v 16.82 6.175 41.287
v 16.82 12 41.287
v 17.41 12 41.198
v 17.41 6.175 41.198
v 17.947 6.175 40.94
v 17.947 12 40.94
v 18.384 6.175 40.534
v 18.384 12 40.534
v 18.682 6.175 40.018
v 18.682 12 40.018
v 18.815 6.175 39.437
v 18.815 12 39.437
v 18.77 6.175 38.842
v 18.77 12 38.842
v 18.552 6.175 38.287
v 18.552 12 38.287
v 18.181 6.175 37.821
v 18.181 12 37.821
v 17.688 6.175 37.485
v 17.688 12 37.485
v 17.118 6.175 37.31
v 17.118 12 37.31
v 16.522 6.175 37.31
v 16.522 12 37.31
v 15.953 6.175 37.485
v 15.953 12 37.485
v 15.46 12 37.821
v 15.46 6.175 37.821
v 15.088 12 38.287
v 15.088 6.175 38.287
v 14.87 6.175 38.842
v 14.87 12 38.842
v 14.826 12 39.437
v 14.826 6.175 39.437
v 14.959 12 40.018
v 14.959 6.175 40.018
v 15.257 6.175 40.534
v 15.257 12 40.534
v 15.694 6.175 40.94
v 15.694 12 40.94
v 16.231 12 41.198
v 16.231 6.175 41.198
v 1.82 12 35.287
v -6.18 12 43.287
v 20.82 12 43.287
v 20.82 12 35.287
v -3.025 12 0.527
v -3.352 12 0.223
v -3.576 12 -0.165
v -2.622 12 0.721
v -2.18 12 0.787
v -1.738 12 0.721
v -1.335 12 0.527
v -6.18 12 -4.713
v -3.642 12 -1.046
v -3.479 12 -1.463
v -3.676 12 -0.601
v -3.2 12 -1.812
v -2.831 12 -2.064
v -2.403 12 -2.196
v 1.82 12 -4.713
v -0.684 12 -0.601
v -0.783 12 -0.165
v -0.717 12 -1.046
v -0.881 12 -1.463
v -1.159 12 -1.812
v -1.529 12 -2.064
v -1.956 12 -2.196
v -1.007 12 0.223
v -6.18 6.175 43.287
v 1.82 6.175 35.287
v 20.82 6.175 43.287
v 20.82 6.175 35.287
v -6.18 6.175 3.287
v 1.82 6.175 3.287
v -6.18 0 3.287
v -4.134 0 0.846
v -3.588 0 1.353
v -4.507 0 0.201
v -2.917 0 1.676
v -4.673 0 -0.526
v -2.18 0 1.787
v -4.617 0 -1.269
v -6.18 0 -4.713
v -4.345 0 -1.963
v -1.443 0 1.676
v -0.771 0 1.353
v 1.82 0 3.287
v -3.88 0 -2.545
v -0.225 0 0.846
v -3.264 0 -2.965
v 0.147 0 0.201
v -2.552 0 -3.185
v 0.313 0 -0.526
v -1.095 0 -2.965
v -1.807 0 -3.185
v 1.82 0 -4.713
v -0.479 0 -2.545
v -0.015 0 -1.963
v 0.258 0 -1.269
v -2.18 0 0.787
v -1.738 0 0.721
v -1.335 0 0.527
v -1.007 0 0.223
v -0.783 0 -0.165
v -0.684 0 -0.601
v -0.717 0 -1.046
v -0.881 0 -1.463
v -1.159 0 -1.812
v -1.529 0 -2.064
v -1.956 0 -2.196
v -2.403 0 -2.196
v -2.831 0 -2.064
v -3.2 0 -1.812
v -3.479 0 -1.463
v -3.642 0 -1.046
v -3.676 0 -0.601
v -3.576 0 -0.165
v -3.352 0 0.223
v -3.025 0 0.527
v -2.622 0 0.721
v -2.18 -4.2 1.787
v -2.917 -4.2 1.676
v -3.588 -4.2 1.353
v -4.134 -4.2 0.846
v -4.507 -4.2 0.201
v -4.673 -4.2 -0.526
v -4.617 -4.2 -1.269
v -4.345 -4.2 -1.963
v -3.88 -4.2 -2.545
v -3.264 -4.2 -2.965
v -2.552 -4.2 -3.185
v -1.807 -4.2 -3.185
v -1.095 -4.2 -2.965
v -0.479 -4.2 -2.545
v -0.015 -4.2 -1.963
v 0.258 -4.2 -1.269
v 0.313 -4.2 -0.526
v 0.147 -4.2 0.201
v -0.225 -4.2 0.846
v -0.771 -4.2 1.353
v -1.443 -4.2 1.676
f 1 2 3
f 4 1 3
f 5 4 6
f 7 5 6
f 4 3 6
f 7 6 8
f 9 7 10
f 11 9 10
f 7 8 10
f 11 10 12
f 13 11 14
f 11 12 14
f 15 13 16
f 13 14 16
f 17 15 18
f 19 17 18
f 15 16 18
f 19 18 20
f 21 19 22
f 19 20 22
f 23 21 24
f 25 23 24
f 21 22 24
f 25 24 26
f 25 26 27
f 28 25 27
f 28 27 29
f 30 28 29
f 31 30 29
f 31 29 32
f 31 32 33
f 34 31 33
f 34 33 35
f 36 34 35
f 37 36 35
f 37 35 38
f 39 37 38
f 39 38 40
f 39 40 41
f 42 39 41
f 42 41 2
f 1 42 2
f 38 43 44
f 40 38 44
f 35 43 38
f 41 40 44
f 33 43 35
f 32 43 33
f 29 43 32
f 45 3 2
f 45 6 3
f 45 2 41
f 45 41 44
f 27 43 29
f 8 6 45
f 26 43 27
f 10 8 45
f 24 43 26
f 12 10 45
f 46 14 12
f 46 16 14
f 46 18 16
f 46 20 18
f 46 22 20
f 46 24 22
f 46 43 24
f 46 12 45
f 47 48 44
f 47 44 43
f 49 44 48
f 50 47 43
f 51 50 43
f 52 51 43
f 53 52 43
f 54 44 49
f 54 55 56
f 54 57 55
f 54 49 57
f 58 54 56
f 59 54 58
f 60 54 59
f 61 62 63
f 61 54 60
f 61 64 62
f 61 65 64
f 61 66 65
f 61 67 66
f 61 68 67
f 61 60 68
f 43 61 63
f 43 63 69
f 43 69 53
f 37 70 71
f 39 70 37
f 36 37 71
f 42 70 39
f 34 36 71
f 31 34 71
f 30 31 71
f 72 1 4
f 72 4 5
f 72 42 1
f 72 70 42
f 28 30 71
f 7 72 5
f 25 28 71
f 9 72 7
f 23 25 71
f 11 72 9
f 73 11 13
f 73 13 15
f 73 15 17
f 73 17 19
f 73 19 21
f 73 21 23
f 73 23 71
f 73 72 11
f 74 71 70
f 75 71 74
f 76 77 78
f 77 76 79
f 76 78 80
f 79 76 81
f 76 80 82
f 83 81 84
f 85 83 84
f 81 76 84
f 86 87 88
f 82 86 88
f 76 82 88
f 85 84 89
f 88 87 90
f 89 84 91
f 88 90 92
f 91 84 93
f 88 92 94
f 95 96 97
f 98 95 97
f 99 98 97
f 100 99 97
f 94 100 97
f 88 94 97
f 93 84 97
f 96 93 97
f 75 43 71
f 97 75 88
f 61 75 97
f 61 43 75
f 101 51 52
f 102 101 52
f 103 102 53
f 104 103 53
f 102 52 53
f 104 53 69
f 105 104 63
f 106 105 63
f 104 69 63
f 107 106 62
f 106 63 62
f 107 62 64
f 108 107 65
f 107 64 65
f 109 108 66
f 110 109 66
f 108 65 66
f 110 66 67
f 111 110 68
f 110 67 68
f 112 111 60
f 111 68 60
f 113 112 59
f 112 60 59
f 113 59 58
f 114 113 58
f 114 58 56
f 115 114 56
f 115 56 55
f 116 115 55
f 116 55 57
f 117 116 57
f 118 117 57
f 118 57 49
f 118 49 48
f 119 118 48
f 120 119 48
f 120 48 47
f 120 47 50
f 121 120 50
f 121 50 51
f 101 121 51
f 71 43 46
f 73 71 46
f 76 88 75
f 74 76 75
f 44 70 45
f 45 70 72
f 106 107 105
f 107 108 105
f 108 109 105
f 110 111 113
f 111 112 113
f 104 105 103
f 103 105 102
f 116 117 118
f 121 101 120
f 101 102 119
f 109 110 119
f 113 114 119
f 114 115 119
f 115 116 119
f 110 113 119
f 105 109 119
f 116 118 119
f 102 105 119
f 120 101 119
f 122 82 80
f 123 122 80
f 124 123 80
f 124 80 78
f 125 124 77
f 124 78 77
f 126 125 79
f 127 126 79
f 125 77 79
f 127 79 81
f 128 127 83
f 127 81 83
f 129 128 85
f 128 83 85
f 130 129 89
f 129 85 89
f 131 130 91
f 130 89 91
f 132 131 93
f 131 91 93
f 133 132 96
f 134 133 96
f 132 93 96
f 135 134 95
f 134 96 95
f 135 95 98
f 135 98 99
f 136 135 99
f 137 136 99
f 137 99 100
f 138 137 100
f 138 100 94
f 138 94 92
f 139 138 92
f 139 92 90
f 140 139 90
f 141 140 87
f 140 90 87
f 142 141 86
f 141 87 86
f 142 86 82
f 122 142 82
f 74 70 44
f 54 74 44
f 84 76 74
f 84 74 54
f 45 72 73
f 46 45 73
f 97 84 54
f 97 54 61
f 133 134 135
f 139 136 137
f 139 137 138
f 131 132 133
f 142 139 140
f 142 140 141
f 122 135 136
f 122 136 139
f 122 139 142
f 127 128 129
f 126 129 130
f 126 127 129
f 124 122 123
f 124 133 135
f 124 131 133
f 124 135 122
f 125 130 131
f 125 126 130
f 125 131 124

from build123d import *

# Parameters (mm, degrees)
SKETCH1_W      = 27
SKETCH1_H      = 48
EXTRUDE1_DEPTH = 12
SKETCH2_R      = 1.5
SKETCH2_R_2    = 2
SKETCH2_W      = 19
SKETCH2_H      = 40
EXTRUDE2_DEPTH = 50.510339849
SKETCH3_W      = 40
SKETCH3_H      = 6.175
EXTRUDE3_DEPTH = 53.409819068
SKETCH7_R      = 2.5
EXTRUDE7_DEPTH = 4.2


with BuildPart() as part:
    # Sketch1 → Extrude1 (new body)
    with BuildSketch(Plane(origin=(0, 0, 0), x_dir=(1, 0, 0), z_dir=(0, 1, 0))):
        with Locations((7.320293399, -19.287286064)):
            Rectangle(SKETCH1_W, SKETCH1_H)
    extrude(amount=EXTRUDE1_DEPTH)

    # Sketch2 → Extrude2 (cut, through all)
    with BuildSketch(Plane(origin=(0, 12, 0), x_dir=(1, 0, 0), z_dir=(0, 1, 0))):
        with Locations(Location((-2.179706601, 0.712713936, 0), (0, 0, 270))):
            Circle(SKETCH2_R)
        with Locations(Location((16.820293399, -39.287286064, 0), (0, 0, 270))):
            Circle(SKETCH2_R_2)
        with Locations((11.320293399, -15.287286064)):
            Rectangle(SKETCH2_W, SKETCH2_H)
    extrude(amount=-EXTRUDE2_DEPTH, mode=Mode.SUBTRACT)

    # Sketch3 → Extrude3 (cut, through all)
    with BuildSketch(Plane(origin=(20.820293399, 0, 0), x_dir=(0, 0, -1), z_dir=(1, 0, 0))):
        with Locations((-23.287286064, 3.0875)):
            Rectangle(SKETCH3_W, SKETCH3_H)
    extrude(amount=-EXTRUDE3_DEPTH, mode=Mode.SUBTRACT)

    # Sketch7 → Extrude7 (add)
    with BuildSketch(Plane.XZ):
        with Locations(Location((-2.179706601, -0.712713936, 0), (0, 0, 90))):
            Circle(SKETCH7_R)
    extrude(amount=EXTRUDE7_DEPTH)


solid = part.part
